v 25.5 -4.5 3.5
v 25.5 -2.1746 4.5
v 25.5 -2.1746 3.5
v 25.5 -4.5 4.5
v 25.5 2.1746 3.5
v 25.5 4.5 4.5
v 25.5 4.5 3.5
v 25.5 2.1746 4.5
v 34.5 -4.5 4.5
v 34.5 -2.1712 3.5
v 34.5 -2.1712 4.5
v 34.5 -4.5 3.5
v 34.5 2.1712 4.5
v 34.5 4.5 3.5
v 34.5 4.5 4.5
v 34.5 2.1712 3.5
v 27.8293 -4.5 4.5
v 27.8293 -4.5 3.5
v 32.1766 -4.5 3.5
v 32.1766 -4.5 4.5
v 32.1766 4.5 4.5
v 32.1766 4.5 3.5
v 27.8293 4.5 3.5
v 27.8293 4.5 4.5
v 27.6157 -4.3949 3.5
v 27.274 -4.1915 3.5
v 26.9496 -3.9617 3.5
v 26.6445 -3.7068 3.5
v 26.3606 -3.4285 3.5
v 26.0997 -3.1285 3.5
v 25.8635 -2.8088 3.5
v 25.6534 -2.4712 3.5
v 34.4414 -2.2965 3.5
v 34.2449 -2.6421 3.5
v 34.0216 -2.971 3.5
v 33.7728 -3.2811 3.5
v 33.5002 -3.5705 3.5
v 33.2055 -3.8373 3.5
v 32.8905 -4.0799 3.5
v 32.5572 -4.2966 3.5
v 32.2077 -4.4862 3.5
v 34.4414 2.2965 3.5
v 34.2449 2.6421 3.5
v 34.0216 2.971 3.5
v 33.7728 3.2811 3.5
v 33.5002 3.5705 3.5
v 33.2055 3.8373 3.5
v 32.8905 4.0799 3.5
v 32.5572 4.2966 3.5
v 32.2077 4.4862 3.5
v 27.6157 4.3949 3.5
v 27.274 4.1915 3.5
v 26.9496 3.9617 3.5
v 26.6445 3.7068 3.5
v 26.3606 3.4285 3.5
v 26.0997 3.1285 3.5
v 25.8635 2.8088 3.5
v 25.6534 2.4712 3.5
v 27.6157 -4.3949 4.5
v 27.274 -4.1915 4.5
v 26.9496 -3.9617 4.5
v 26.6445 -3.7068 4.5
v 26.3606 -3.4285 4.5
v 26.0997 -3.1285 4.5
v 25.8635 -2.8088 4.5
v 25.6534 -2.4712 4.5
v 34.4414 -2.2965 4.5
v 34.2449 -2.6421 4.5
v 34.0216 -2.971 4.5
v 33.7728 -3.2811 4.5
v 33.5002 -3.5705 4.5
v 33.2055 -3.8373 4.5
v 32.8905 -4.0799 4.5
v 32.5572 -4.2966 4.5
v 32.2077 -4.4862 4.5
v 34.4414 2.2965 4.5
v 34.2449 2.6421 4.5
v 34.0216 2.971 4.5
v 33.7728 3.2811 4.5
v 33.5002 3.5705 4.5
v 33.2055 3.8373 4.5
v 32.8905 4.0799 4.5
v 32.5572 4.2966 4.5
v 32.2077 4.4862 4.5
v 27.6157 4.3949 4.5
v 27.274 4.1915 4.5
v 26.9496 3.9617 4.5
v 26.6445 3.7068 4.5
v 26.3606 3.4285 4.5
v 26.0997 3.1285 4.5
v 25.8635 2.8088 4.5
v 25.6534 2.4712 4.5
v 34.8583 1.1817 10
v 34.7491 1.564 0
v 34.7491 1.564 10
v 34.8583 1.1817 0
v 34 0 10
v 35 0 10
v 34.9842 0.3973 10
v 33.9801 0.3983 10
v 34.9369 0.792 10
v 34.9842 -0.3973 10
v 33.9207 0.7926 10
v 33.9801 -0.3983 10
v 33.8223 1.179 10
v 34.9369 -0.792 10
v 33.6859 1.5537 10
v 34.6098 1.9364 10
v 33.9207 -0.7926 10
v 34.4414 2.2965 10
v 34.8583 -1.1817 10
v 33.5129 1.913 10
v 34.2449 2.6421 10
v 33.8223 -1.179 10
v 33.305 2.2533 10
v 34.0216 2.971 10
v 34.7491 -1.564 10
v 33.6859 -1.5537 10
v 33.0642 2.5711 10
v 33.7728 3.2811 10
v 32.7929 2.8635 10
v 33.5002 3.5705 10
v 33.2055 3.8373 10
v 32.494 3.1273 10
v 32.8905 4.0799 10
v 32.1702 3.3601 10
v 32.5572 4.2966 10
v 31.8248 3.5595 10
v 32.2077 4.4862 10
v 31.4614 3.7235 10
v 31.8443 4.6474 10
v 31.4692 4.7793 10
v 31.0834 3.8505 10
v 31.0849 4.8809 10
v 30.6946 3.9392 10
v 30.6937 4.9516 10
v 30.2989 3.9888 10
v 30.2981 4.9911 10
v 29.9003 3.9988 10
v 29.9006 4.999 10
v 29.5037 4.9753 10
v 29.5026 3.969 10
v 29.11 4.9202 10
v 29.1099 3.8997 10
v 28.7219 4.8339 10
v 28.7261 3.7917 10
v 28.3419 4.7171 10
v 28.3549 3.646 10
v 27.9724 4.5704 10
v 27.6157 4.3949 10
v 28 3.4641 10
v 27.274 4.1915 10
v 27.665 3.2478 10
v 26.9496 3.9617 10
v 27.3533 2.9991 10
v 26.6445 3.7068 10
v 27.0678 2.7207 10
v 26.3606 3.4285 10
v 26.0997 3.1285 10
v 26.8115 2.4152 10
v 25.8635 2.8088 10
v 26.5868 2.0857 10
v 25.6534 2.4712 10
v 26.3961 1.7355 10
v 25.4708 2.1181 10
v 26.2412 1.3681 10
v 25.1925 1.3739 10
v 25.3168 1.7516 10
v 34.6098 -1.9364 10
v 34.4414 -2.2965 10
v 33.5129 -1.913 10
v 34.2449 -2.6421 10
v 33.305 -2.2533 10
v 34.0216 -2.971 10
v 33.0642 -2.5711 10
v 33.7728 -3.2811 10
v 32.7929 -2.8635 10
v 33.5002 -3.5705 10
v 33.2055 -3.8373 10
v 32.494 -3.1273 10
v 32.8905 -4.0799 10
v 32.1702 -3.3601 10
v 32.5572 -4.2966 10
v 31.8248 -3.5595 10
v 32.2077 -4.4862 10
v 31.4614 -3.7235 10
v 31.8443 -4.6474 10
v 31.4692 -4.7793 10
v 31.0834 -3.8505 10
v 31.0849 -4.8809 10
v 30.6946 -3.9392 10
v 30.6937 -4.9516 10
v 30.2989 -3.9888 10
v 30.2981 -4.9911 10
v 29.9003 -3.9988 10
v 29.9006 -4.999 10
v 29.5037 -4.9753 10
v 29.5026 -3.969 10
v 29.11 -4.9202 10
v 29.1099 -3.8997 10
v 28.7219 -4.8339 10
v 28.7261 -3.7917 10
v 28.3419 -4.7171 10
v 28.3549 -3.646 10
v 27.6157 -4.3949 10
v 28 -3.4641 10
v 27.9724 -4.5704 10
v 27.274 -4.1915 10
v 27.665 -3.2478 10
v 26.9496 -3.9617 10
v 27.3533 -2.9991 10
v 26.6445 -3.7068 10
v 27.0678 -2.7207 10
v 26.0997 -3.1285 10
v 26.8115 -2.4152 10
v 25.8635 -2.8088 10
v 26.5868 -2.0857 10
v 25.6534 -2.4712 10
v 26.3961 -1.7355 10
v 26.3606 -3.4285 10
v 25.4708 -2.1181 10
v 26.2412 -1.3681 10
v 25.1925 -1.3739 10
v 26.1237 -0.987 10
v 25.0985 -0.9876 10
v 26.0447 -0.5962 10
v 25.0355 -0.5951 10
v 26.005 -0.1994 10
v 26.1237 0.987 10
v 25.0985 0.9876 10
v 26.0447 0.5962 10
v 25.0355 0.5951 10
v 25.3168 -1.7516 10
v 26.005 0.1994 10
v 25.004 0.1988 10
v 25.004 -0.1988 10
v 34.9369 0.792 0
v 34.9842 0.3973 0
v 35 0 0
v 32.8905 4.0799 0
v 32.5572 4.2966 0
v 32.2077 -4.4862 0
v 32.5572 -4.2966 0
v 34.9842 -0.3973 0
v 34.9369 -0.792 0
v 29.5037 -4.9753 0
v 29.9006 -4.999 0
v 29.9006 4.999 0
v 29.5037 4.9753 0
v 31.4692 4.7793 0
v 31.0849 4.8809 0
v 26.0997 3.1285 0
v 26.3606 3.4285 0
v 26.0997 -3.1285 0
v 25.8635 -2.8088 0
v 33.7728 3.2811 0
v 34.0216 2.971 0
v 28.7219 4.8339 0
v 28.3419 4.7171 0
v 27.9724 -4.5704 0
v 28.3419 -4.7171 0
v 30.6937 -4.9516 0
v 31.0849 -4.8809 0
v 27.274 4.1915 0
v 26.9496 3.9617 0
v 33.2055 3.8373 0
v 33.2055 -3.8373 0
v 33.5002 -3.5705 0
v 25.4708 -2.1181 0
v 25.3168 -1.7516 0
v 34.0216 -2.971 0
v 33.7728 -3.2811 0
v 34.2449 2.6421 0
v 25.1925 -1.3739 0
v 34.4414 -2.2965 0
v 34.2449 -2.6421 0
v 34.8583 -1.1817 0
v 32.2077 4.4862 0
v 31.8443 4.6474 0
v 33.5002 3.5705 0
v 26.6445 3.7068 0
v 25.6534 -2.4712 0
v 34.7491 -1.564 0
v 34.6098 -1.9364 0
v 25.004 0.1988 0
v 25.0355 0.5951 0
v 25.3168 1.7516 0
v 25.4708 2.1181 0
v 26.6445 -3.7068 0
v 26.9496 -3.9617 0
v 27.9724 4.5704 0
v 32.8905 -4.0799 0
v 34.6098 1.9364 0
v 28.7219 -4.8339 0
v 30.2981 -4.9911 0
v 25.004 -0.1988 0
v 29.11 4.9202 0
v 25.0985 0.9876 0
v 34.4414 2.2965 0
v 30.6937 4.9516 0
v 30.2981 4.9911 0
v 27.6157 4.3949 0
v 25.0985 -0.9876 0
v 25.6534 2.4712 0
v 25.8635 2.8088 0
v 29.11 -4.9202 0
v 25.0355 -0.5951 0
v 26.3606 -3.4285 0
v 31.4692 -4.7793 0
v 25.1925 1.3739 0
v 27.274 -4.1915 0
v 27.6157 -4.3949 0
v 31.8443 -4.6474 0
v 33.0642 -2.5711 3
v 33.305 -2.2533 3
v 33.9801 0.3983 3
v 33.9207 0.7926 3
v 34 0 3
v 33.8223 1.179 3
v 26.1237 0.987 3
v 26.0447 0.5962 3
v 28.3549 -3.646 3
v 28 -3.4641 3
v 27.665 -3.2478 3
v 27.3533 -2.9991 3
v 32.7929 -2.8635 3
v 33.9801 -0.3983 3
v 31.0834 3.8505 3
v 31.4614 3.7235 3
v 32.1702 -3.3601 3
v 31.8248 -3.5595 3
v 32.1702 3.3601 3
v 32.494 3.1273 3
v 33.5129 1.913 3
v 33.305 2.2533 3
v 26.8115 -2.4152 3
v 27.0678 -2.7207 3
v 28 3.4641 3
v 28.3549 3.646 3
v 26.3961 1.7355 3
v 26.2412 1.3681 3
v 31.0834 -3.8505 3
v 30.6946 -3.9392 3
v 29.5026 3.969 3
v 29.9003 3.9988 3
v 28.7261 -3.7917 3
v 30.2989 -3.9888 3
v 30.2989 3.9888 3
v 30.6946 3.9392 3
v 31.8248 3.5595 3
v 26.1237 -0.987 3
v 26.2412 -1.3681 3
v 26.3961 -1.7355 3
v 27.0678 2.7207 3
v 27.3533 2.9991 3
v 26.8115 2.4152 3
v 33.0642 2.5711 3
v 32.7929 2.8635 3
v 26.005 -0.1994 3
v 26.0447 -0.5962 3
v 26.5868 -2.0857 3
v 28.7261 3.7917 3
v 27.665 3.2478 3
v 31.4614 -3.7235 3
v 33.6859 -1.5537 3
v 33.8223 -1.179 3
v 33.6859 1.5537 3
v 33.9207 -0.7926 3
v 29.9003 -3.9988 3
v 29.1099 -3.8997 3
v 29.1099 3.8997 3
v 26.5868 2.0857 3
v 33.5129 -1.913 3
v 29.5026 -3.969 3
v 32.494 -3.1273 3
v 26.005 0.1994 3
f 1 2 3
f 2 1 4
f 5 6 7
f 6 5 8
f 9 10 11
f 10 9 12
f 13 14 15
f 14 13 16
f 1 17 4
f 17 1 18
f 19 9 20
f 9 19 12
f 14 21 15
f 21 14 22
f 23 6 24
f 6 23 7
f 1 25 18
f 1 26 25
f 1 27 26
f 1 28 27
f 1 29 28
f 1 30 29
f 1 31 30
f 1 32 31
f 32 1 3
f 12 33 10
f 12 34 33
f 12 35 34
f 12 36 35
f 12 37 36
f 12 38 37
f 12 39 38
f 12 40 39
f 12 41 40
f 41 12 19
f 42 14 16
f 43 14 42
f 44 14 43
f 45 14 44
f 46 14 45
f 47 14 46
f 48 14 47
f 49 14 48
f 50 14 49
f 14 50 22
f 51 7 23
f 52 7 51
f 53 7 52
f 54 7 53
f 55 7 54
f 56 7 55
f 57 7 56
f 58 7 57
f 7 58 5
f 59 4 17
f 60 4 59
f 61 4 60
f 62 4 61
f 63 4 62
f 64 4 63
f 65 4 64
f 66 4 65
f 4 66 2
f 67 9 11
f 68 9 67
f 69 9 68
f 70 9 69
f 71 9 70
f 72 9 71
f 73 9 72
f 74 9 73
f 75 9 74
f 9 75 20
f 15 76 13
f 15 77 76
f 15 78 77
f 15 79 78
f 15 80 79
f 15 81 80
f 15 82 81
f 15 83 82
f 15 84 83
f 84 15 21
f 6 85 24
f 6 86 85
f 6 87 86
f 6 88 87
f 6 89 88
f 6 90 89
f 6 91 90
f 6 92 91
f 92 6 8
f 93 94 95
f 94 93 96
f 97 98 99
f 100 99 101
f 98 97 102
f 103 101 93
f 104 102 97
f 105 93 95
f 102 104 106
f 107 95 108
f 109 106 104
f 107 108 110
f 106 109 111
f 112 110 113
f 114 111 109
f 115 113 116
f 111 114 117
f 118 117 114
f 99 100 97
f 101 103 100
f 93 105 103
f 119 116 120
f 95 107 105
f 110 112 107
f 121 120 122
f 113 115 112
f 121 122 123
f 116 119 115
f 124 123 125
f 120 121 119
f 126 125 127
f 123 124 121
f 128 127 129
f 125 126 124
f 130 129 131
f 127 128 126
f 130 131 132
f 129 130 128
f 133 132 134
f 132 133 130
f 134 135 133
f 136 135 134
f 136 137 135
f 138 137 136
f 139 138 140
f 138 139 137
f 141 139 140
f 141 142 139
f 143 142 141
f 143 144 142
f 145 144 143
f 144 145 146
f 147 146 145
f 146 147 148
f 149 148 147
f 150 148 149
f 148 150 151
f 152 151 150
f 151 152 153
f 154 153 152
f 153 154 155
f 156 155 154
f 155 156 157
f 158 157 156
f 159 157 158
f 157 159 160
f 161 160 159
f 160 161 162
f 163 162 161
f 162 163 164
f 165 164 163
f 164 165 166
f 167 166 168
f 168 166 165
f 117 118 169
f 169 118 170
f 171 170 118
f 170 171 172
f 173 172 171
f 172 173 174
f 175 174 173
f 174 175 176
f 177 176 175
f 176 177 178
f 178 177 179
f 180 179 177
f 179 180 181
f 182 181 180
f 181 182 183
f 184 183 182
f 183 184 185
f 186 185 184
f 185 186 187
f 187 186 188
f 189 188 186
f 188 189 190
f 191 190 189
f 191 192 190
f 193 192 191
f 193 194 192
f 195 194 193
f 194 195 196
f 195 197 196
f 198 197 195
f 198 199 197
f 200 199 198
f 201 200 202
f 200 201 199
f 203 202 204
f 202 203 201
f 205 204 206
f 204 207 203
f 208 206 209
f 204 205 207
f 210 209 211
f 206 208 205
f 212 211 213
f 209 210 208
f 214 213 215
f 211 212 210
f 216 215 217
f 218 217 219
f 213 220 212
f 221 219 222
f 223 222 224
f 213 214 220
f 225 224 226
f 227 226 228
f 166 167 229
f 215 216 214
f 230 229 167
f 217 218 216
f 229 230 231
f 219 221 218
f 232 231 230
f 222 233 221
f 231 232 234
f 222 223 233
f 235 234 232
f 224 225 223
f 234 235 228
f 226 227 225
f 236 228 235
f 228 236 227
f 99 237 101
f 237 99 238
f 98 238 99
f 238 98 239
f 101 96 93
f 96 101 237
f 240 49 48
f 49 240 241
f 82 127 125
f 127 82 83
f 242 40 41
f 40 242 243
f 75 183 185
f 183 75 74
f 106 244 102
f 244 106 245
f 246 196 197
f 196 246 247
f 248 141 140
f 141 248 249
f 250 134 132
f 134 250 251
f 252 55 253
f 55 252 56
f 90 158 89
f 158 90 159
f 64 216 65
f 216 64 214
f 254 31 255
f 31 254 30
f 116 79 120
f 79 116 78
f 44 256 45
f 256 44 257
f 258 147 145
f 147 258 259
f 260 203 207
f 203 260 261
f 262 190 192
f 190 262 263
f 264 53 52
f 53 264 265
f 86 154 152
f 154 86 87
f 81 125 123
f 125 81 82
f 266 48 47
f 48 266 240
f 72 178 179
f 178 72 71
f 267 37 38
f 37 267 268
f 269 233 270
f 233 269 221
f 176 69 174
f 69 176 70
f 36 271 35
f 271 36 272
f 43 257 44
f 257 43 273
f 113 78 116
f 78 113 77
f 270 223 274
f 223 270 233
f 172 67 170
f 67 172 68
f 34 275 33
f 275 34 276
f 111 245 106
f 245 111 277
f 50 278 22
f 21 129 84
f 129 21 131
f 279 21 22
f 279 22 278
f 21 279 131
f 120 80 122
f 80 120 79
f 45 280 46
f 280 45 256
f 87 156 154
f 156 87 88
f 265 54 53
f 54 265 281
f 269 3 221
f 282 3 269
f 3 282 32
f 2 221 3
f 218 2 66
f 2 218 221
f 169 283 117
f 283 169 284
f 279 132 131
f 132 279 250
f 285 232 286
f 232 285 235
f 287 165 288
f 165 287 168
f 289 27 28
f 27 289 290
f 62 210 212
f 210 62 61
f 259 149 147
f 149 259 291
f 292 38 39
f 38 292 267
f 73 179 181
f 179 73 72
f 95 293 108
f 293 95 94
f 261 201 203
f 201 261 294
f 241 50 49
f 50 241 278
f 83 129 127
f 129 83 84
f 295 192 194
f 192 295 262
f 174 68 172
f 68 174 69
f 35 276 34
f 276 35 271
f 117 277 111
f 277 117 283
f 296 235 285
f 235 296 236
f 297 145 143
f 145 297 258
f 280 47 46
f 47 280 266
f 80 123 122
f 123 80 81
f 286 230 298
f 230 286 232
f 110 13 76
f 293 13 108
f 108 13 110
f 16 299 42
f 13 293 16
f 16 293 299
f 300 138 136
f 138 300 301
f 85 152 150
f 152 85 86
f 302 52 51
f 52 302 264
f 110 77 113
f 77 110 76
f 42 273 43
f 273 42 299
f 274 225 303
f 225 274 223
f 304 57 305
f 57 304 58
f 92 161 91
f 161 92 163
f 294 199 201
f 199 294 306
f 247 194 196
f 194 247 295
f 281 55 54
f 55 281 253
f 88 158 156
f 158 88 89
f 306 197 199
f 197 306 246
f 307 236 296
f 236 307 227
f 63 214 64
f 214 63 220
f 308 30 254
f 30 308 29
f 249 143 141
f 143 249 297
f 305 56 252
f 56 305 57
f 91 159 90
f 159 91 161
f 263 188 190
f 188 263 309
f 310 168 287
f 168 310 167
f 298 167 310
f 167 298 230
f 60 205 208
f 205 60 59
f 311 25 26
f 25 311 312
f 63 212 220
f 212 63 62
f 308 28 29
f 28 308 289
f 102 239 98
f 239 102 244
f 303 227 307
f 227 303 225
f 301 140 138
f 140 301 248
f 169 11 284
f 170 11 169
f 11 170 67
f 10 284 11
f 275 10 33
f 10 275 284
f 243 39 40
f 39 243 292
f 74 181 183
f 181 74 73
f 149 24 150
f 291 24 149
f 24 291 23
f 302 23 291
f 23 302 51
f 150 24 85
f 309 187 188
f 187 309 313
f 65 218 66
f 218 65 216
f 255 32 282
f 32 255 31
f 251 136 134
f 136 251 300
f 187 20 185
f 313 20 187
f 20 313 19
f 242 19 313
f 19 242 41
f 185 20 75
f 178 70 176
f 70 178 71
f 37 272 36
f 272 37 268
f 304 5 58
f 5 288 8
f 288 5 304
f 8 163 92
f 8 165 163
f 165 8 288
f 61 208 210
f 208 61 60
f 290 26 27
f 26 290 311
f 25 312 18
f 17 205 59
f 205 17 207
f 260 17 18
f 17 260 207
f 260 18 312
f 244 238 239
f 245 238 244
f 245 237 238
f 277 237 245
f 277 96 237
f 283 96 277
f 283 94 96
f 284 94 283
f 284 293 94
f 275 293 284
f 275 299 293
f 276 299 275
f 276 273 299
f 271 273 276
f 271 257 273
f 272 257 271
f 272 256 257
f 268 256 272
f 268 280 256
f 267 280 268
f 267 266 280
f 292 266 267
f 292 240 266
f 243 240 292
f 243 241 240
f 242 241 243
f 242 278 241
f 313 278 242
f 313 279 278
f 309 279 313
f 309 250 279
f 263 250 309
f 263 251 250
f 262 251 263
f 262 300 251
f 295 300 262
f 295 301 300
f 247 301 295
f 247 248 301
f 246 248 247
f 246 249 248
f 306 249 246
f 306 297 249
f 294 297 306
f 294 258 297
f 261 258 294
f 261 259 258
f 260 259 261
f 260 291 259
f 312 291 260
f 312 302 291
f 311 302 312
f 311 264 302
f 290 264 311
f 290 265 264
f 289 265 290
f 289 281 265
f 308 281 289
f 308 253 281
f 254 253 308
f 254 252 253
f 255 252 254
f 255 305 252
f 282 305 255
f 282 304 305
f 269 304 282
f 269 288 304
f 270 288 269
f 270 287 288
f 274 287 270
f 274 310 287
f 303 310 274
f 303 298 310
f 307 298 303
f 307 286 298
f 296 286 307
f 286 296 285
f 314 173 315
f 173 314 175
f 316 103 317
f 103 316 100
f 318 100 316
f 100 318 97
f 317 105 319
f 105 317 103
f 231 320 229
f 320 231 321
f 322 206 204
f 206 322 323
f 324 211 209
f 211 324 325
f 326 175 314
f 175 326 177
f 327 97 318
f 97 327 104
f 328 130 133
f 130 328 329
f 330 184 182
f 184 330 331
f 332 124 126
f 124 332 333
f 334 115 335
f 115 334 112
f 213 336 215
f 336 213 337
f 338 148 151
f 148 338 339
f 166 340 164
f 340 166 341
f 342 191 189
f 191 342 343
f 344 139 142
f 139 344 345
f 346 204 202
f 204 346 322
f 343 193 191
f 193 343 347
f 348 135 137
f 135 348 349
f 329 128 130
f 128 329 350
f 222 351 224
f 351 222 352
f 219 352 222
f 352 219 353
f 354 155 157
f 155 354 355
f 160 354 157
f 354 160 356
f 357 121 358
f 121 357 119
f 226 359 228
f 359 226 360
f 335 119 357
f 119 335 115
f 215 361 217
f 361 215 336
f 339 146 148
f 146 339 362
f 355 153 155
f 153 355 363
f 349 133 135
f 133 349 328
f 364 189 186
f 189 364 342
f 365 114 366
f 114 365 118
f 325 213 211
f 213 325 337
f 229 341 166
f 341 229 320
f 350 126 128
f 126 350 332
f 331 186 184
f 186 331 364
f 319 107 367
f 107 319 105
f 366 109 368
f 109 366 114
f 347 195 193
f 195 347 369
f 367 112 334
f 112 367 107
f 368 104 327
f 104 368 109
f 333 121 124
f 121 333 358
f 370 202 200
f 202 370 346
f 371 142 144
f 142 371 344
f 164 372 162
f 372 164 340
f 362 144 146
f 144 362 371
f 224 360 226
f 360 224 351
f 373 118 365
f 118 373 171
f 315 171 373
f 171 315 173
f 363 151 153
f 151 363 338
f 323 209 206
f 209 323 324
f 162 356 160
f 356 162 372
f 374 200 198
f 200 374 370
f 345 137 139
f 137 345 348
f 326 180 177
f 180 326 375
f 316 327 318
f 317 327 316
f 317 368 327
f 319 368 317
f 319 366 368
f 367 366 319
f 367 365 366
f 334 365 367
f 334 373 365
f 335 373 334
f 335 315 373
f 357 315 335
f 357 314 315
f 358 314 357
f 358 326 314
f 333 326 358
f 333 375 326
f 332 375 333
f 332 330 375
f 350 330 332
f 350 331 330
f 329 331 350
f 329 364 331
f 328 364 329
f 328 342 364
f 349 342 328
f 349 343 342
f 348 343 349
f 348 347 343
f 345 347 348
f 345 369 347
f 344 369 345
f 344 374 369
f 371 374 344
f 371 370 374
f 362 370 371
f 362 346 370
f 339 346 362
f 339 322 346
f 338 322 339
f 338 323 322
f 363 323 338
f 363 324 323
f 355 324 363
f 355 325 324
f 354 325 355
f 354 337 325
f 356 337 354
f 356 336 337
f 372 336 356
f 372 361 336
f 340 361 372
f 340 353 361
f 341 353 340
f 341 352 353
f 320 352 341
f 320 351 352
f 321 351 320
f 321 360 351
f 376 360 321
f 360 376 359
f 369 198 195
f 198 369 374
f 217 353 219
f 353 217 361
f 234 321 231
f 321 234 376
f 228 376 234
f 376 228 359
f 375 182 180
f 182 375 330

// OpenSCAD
$fa = 1; 
$fs = 0.4;

translate([30,0,0])
//subtract out inner cylinder
difference() {

// add cube and cylinder
union() {
//cube
translate([0,0,4])
rotate([90,0,0])
cube([9,1,9], center = true);
//cylinder
translate([0,0,5])
cylinder (h = 10, r=5, center = true);

}

    translate([0,0,7])
	cylinder (h = 8, r=4, center = true);

}
